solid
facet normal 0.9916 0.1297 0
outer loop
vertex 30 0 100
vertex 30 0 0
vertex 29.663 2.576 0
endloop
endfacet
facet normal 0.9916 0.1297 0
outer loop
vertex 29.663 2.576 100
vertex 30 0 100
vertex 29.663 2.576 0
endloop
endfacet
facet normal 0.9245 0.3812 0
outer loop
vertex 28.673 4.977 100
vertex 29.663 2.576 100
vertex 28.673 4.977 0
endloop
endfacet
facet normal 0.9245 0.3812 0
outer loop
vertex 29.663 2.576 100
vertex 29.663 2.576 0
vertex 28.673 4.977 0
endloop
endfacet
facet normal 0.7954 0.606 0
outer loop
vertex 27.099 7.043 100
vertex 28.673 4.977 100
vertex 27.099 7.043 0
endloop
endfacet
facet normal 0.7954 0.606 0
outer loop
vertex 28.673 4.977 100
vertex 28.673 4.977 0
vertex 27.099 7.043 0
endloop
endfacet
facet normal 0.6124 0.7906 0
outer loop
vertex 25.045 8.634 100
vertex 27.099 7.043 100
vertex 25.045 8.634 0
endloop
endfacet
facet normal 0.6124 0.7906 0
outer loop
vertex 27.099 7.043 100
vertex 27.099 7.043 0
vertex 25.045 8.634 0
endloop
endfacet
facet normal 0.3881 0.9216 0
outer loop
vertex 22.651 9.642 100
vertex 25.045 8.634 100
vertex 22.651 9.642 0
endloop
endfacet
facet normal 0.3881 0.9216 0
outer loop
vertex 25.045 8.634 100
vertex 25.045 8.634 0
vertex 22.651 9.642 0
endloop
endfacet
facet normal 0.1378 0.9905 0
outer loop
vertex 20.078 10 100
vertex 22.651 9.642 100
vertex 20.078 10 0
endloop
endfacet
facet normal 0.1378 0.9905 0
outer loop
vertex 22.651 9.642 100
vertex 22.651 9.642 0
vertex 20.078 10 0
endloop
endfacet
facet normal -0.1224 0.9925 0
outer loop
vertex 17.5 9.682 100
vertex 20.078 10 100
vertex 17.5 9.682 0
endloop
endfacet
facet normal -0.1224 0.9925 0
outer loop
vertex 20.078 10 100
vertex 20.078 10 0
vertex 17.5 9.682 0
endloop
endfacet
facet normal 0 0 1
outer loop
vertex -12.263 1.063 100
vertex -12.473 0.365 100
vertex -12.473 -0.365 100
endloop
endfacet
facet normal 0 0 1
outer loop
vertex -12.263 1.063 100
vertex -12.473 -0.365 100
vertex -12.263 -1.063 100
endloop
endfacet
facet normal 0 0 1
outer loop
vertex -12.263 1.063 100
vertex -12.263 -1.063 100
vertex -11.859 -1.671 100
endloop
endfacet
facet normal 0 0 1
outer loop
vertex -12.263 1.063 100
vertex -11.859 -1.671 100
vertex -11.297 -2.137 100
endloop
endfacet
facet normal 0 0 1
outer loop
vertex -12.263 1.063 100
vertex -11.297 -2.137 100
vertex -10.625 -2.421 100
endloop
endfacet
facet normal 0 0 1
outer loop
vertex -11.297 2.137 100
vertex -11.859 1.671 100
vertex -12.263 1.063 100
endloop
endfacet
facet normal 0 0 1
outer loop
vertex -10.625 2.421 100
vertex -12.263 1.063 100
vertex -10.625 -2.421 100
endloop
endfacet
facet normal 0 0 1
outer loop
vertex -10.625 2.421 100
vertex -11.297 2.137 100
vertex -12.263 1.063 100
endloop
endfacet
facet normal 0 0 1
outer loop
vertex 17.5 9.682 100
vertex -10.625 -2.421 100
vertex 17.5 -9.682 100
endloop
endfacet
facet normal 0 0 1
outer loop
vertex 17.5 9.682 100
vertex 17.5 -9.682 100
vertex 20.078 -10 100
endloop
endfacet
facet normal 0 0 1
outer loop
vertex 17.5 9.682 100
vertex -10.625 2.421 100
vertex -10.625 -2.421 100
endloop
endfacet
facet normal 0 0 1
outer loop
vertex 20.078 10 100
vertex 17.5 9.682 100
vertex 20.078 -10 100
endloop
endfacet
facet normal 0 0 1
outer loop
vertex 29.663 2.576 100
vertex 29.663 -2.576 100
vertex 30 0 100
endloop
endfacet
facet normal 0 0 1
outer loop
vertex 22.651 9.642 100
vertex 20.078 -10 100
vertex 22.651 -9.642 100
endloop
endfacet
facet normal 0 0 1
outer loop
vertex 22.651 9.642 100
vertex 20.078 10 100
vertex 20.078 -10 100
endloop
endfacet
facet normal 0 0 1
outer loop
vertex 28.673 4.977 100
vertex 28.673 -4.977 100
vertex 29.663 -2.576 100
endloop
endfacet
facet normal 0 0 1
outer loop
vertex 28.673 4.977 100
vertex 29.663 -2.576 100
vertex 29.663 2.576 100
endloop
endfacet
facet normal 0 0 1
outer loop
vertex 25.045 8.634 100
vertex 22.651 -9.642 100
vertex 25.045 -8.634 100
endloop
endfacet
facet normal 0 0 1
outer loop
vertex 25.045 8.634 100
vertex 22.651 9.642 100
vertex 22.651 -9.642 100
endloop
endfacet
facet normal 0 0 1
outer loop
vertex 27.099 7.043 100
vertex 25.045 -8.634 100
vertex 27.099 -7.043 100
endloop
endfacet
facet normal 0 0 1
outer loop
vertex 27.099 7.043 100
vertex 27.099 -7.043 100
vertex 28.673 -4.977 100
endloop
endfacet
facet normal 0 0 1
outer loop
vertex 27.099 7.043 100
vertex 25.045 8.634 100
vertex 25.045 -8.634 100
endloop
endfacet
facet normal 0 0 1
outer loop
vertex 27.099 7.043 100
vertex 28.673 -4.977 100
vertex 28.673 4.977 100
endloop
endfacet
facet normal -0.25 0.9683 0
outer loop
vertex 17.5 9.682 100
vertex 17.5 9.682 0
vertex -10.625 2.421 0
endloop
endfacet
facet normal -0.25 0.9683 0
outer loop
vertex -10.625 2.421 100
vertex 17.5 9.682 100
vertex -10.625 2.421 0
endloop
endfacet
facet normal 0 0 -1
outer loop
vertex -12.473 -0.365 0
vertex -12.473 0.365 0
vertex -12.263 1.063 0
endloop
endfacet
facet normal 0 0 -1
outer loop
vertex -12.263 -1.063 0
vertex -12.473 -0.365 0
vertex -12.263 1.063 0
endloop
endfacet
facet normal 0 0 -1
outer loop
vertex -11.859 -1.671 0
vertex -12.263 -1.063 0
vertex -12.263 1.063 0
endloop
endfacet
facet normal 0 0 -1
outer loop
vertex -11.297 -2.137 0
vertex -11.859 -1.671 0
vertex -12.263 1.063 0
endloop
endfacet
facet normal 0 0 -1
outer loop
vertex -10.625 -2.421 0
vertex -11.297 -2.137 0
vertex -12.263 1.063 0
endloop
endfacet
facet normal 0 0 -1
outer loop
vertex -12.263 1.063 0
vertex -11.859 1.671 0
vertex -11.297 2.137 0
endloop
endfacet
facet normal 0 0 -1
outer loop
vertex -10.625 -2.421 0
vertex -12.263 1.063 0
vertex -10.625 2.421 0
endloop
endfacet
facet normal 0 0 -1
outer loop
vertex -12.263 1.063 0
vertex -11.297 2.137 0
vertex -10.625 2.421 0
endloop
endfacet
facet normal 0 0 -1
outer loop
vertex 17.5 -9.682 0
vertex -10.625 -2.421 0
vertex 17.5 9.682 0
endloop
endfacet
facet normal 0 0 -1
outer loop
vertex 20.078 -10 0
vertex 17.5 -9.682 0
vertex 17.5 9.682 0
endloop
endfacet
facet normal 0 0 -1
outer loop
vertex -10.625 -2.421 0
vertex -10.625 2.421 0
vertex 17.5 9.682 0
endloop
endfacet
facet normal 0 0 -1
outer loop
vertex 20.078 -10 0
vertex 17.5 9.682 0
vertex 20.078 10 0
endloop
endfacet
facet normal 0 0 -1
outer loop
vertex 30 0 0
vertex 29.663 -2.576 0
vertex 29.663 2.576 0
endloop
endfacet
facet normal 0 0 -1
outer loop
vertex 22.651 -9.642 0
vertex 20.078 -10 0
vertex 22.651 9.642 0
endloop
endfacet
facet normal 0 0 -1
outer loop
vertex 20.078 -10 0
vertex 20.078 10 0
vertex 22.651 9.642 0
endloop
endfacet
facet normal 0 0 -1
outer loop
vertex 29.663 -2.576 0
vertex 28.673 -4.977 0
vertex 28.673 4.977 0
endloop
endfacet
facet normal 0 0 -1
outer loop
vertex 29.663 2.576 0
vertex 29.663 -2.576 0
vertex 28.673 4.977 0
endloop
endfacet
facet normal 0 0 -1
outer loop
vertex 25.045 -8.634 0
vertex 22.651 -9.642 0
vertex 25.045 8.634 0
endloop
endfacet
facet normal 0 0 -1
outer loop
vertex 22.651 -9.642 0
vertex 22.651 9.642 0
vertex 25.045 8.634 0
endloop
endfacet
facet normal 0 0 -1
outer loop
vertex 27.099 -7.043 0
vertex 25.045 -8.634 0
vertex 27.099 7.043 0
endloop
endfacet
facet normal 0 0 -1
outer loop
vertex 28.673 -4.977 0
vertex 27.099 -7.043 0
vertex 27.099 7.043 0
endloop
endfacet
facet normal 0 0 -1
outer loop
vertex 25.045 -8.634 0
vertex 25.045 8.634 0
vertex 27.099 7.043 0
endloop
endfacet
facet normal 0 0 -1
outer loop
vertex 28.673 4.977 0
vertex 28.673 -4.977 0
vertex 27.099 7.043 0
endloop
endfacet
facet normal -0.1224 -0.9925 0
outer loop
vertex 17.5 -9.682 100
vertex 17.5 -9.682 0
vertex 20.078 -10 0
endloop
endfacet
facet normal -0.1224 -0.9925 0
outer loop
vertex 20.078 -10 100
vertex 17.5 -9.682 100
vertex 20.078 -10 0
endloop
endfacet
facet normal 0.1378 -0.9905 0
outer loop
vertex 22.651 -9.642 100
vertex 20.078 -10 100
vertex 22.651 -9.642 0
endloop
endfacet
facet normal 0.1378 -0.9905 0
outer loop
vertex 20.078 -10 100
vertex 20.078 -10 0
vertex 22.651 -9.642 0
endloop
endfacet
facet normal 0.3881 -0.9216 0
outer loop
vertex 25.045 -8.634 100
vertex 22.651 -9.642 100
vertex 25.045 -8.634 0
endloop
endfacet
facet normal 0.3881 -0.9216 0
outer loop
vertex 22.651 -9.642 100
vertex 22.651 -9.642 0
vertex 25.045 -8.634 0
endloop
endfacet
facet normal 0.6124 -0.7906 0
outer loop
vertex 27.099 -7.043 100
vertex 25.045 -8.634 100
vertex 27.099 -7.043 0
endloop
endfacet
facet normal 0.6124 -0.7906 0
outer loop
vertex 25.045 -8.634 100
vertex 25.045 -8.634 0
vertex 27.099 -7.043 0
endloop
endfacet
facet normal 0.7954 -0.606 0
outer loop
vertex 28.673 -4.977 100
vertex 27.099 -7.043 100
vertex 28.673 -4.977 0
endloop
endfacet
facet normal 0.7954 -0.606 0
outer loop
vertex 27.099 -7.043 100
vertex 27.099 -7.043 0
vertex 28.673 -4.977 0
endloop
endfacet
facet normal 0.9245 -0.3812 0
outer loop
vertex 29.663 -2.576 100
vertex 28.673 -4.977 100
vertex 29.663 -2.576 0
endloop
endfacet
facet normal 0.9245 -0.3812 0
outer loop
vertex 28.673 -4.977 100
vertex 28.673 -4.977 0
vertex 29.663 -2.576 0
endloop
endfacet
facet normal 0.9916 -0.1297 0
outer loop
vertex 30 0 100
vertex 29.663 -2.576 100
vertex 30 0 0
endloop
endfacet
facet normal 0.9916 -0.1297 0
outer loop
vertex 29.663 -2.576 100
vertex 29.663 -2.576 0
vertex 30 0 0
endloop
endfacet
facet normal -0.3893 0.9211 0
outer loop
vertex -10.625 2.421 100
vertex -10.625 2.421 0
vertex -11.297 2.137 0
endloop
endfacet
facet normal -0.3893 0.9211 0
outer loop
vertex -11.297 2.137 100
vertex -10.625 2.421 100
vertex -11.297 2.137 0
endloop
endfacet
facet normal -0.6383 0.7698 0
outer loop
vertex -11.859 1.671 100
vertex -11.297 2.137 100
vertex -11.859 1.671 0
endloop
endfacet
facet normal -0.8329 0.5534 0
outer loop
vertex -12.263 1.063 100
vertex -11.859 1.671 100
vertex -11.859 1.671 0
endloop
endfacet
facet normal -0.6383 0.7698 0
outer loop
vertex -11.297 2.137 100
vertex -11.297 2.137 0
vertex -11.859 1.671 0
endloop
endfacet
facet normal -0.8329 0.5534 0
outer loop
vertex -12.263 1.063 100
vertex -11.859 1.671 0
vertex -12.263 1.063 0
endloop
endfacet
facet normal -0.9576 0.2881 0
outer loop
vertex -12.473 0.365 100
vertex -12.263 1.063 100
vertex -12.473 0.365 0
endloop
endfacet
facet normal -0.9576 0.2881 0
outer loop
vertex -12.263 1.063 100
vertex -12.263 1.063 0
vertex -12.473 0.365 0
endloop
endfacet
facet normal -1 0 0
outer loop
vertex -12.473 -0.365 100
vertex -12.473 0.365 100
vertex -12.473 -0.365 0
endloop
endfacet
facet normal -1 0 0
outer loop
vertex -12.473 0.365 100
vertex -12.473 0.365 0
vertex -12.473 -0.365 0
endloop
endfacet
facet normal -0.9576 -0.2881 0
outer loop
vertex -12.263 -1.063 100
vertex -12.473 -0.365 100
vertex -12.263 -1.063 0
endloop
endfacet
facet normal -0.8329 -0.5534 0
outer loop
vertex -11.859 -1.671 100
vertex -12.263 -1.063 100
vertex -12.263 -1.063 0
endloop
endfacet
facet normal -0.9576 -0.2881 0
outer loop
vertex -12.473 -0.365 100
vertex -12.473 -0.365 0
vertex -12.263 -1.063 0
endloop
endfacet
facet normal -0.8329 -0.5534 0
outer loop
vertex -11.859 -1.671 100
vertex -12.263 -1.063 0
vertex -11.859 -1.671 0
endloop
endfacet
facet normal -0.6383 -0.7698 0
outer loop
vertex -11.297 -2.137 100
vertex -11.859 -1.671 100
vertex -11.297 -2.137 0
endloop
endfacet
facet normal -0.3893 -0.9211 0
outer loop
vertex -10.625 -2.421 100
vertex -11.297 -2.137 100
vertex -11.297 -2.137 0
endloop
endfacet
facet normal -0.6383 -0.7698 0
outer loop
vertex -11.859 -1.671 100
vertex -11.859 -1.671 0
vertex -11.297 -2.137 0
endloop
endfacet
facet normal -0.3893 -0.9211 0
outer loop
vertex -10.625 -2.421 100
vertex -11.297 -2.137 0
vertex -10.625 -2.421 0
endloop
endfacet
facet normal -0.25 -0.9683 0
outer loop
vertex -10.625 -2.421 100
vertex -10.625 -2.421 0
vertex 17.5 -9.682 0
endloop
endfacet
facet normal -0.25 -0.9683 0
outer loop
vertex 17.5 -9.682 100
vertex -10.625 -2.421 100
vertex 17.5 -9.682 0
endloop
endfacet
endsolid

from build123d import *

# Parameters (mm, degrees)
F1_DEPTH = 100


with BuildPart() as f1:
    # F0 (on Top) → F1 (new body)
    with BuildSketch(Plane.XY):
        with BuildLine():
            ThreePointArc((-10.625, 2.420615), (-8.469069, 1.976424), (-7.5, 0))
            ThreePointArc((-7.5, 0), (-8.469069, -1.976424), (-10.625, -2.420615))
            Line((-10.625, -2.420615), (17.5, -9.682458))
            ThreePointArc((17.5, -9.682458), (10, 0), (17.5, 9.682458))
            Line((17.5, 9.682458), (-10.625, 2.420615))
        make_face()
        with BuildLine():
            ThreePointArc((30, 0), (26.123724, 7.905694), (17.5, 9.682458))
            ThreePointArc((17.5, 9.682458), (10, 0), (17.5, -9.682458))
            ThreePointArc((17.5, -9.682458), (26.123724, -7.905694), (30, 0))
        make_face()
        with BuildLine():
            ThreePointArc((-10.625, -2.420615), (-8.469069, -1.976424), (-7.5, 0))
            ThreePointArc((-7.5, 0), (-8.469069, 1.976424), (-10.625, 2.420615))
            ThreePointArc((-10.625, 2.420615), (-12.5, 0), (-10.625, -2.420615))
        make_face()
    extrude(amount=F1_DEPTH)


solid = f1.part
